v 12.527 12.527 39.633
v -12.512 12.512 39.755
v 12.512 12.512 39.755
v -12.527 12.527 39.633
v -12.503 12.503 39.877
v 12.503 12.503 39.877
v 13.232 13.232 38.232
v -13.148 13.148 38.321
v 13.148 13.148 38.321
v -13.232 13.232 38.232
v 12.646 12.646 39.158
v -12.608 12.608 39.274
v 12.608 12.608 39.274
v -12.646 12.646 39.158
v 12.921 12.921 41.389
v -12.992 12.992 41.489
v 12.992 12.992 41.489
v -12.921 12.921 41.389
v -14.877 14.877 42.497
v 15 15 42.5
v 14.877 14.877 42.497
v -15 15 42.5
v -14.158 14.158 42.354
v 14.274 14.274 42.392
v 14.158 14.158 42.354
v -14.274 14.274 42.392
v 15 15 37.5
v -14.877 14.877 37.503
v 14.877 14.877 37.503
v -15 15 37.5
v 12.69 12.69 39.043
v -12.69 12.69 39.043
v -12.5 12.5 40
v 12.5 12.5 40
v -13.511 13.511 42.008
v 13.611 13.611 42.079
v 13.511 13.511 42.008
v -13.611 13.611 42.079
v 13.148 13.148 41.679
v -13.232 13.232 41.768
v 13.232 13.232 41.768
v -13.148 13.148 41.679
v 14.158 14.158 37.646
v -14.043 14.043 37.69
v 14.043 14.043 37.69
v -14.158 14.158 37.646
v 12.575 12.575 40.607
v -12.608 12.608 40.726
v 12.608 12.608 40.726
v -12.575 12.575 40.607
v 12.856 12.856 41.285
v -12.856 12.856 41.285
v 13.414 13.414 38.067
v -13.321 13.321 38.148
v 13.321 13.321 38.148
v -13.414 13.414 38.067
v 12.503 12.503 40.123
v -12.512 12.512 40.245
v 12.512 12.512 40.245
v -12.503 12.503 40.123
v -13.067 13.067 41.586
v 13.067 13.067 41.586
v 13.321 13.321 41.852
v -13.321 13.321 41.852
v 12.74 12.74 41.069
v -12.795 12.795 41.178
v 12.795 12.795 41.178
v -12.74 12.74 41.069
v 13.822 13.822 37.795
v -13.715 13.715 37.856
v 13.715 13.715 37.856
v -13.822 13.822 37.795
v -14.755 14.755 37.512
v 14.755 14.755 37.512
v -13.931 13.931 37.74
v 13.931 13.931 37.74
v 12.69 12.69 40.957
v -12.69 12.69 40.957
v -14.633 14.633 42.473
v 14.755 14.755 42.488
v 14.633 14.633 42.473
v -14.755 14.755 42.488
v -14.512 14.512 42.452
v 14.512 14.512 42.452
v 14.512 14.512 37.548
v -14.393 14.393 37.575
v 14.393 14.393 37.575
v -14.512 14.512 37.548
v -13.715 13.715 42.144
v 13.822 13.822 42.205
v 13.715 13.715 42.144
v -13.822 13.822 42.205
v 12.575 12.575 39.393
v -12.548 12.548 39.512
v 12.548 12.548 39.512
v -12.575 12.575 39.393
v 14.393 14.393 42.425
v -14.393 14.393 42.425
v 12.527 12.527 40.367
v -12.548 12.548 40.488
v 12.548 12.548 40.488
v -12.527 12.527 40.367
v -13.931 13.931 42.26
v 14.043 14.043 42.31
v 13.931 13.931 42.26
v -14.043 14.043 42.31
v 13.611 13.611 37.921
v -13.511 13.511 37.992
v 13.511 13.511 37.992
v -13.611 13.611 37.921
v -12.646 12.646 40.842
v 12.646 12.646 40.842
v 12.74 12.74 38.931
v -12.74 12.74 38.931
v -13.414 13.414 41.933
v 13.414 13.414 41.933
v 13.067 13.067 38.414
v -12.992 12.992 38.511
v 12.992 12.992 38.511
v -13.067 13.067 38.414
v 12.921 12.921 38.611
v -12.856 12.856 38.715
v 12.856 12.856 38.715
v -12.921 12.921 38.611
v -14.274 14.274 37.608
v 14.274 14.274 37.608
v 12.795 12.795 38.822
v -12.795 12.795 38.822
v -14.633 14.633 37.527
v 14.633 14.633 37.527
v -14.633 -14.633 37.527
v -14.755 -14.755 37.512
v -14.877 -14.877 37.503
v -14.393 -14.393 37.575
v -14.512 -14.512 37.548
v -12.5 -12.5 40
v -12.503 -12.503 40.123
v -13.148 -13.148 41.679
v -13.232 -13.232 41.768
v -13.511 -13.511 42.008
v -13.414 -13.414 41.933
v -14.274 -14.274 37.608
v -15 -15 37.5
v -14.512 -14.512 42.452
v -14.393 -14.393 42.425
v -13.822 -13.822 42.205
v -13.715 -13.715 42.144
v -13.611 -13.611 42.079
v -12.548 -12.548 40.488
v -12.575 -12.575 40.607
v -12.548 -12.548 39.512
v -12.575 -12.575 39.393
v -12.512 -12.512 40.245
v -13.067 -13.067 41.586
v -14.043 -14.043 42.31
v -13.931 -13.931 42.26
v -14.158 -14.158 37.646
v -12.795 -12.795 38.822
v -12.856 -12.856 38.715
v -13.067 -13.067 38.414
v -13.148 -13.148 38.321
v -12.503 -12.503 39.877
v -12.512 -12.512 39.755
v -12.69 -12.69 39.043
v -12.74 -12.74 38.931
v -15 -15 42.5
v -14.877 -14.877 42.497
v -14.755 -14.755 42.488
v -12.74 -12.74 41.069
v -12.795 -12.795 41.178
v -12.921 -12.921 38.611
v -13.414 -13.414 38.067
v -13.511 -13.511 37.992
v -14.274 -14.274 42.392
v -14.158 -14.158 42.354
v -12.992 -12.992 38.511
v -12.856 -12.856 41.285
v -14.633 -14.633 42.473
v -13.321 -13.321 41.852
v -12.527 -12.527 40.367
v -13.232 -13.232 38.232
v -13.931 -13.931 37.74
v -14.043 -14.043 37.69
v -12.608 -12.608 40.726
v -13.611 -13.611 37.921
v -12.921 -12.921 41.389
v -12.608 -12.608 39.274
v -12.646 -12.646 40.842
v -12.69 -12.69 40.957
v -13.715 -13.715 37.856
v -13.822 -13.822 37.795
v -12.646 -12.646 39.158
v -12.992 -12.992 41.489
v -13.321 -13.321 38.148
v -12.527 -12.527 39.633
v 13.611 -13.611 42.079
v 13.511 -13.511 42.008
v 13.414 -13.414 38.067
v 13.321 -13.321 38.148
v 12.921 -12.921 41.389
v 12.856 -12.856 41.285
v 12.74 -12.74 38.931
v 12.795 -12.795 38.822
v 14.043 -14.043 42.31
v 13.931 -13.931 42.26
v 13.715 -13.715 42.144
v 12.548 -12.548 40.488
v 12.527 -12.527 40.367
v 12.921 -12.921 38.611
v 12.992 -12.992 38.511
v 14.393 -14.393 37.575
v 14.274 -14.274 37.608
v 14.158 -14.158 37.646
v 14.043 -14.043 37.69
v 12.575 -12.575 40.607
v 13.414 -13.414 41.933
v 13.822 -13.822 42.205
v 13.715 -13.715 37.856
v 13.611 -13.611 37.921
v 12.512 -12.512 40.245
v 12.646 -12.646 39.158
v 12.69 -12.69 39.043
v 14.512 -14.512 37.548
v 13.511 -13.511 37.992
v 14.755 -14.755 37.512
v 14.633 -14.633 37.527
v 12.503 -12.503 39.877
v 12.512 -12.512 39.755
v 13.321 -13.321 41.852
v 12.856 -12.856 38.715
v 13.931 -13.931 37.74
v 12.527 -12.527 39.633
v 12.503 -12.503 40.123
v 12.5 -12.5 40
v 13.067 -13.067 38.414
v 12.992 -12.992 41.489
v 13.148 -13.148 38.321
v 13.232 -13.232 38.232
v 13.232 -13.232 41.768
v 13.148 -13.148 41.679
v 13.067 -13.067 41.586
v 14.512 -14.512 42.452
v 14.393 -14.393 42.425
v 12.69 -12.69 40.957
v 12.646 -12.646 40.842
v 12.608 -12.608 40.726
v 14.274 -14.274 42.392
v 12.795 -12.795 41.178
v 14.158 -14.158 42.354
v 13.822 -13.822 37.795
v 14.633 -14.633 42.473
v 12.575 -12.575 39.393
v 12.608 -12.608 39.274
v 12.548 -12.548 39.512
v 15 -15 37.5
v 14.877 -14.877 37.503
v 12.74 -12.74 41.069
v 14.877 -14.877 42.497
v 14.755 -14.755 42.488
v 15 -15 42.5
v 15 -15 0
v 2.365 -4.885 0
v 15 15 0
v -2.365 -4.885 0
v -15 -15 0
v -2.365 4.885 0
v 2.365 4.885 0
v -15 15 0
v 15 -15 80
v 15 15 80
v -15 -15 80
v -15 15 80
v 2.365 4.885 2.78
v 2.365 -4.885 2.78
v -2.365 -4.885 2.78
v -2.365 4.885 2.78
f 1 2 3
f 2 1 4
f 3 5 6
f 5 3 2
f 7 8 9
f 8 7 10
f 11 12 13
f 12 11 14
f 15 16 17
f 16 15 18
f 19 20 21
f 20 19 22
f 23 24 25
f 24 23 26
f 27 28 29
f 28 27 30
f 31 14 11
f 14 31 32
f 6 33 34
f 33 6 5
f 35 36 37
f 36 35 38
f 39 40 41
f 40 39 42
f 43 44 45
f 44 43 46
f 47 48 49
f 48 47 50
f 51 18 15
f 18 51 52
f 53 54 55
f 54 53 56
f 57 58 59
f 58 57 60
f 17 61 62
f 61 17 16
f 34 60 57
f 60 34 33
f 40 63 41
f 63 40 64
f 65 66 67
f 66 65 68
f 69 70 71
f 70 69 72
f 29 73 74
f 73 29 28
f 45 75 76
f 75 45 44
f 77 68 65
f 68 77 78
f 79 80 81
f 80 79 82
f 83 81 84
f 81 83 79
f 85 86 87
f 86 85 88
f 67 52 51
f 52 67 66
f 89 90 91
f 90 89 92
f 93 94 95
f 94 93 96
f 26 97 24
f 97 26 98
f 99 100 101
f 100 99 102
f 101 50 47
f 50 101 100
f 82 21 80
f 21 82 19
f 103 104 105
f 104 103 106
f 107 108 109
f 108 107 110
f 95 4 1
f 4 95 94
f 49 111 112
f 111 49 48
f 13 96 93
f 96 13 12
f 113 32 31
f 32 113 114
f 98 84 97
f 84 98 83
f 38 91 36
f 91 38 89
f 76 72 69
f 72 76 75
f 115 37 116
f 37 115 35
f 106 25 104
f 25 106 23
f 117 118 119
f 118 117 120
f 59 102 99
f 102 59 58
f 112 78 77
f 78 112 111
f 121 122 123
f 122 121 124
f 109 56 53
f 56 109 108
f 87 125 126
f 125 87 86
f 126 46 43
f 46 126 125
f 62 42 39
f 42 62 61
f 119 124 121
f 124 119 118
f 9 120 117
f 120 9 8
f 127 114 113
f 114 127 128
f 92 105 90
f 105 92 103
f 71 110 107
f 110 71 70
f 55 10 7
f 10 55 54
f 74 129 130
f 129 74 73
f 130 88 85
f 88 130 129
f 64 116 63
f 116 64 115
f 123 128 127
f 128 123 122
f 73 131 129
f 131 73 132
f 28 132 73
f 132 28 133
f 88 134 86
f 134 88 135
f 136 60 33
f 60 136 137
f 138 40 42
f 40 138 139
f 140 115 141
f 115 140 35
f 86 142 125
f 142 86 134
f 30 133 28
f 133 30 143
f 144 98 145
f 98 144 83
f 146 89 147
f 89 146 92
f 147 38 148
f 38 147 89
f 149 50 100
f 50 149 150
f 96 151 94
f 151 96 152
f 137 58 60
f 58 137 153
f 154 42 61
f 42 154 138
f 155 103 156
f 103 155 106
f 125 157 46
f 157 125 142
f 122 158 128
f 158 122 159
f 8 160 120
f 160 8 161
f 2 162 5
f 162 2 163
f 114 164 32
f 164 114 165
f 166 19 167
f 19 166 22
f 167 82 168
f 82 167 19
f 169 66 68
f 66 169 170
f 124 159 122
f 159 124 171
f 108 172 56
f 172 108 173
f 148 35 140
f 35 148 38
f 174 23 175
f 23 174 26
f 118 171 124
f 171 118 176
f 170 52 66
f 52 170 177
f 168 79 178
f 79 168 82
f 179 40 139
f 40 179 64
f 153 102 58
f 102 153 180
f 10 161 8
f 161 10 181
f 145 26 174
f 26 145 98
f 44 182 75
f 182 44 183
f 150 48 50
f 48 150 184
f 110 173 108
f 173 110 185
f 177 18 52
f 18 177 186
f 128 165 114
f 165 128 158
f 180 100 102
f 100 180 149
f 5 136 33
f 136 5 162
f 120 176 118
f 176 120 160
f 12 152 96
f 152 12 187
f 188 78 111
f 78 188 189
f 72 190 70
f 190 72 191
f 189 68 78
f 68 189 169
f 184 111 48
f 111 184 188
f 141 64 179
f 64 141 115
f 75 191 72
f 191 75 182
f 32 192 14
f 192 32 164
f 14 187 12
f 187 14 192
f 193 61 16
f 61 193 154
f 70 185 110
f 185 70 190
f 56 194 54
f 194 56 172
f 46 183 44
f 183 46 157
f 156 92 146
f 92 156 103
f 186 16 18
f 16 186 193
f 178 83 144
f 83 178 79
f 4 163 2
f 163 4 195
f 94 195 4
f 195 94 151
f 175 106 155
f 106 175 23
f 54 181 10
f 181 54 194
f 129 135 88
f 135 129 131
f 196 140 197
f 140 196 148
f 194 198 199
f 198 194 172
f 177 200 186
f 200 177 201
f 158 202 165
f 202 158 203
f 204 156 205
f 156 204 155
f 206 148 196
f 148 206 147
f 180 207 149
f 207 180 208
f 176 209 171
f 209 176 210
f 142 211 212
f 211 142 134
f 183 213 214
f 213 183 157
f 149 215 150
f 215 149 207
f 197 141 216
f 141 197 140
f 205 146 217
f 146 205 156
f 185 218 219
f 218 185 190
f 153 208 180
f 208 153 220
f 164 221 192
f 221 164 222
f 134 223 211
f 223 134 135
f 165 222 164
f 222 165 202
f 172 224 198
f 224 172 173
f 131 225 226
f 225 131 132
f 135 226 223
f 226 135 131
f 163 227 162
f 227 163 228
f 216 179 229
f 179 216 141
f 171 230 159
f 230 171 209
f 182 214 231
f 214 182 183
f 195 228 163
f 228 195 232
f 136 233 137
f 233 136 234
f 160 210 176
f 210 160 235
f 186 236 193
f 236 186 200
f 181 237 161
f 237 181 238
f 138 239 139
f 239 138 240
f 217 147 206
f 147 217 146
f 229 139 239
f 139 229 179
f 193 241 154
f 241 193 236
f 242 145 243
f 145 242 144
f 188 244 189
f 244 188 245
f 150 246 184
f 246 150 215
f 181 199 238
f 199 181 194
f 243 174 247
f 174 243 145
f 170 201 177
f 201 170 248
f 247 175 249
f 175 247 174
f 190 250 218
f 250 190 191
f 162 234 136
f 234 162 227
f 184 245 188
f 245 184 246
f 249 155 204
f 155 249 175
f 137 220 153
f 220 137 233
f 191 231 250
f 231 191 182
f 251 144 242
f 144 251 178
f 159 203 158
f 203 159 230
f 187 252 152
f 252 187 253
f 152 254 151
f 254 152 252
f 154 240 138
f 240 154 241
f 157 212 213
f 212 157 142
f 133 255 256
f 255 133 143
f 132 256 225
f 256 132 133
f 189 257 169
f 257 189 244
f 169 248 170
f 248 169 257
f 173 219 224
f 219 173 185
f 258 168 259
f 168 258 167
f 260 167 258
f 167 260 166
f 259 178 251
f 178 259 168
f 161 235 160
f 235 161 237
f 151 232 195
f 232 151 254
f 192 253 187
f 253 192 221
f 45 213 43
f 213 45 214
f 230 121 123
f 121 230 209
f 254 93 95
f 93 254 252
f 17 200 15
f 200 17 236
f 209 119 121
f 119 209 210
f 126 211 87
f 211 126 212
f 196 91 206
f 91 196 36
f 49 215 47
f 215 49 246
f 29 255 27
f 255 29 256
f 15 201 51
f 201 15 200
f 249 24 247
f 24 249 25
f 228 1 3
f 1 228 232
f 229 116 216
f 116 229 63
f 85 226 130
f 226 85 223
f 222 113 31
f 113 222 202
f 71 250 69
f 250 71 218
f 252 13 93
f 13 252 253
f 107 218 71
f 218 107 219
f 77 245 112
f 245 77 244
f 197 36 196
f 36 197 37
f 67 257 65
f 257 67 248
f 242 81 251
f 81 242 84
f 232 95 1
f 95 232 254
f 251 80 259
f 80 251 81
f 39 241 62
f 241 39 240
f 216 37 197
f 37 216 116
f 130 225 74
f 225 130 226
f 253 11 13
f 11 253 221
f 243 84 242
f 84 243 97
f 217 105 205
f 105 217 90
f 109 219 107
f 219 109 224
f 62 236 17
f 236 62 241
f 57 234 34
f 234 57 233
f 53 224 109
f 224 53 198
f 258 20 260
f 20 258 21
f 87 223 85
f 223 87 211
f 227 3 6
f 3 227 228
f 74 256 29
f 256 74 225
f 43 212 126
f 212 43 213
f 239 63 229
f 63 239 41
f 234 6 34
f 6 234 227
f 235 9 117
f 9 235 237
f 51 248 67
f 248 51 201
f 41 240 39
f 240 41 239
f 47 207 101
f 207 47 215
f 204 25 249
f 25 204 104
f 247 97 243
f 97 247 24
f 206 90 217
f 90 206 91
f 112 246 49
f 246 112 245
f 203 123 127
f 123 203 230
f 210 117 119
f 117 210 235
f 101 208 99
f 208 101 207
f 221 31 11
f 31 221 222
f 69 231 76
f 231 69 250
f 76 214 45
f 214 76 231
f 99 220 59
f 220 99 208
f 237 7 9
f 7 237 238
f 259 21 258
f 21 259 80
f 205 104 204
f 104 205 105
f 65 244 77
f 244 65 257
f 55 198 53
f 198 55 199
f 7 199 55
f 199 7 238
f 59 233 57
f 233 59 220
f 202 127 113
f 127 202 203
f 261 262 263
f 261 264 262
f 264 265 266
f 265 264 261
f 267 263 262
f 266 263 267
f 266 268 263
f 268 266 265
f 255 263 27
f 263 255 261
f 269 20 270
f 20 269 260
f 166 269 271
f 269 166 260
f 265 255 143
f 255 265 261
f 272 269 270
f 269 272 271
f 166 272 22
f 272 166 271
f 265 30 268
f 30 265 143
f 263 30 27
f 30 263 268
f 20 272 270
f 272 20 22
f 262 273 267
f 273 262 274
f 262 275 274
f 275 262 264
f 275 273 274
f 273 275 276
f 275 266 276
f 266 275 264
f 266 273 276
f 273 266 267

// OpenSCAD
difference()
{
    difference()
    {
        linear_extrude(height = 80.0, twist = 0.0, scale = 1.0, slices = 1, center = false)
        {
            scale([30.0, 30.0])
            {
                M8();
            }
        }
        union()
        {
            union()
            {
                union()
                {
                    translate([-15.0, 15.0, 40.0])
                    {
                        rotate([0.0, 0.0, 0.0])
                        {
                            rotate([0.0, 90.0, 0.0])
                            {
                                rotate([0.0, 0.0, 0.0])
                                {
                                    linear_extrude(height = 31.0, twist = 0.0, scale = 1.0, slices = 1, center = false)
                                    {
                                        scale([5.0, 5.0])
                                        {
                                            M196();
                                        }
                                    }
                                }
                            }
                        }
                    }
                    translate([-15.0, 15.0, 40.0])
                    {
                        rotate([0.0, 0.0, 0.0])
                        {
                            rotate([0.0, 0.0, 0.0])
                            {
                                rotate([90.0, 0.0, 0.0])
                                {
                                    linear_extrude(height = 31.0, twist = 0.0, scale = 1.0, slices = 1, center = false)
                                    {
                                        scale([5.0, 5.0])
                                        {
                                            M196();
                                        }
                                    }
                                }
                            }
                        }
                    }
                }
                translate([-15.0, -15.0, 40.0])
                {
                    rotate([0.0, 0.0, 0.0])
                    {
                        rotate([0.0, 90.0, 0.0])
                        {
                            rotate([0.0, 0.0, 0.0])
                            {
                                linear_extrude(height = 31.0, twist = 0.0, scale = 1.0, slices = 1, center = false)
                                {
                                    scale([5.0, 5.0])
                                    {
                                        M196();
                                    }
                                }
                            }
                        }
                    }
                }
            }
            translate([15.0, 15.0, 40.0])
            {
                rotate([0.0, 0.0, 0.0])
                {
                    rotate([0.0, 0.0, 0.0])
                    {
                        rotate([90.0, 0.0, 0.0])
                        {
                            linear_extrude(height = 31.0, twist = 0.0, scale = 1.0, slices = 1, center = false)
                            {
                                scale([5.0, 5.0])
                                {
                                    M196();
                                }
                            }
                        }
                    }
                }
            }
        }
    }
    translate([0.0, 0.0, -0.1])
    {
        linear_extrude(height = 2.88, twist = 0.0, scale = 1.0, slices = 1, center = false)
        {
            scale([4.73, 9.77])
            {
                M8();
            }
        }
    }
}

module M196()
{
    polygon
    (
        points =
        [
            [0.5, 0.0], 
            [0.4993977281025862, 0.024533837163709007], 
            [0.49759236333609846, 0.0490085701647803], 
            [0.4945882549823905, 0.07336523722768087], 
            [0.4903926402016152, 0.09754516100806412], 
            [0.485015626597272, 0.12149008995163194], 
            [0.4784701678661044, 0.14514233862723117], 
            [0.4707720325915104, 0.16844492669611003], 
            [0.46193976625564337, 0.1913417161825449], 
            [0.45199464656172167, 0.21377754671514104], 
            [0.4409606321741775, 0.23569836841299882], 
            [0.42886430500013606, 0.25705137209661083], 
            [0.4157348061512726, 0.2777851165098011], 
            [0.40160376574032247, 0.2978496522462167], 
            [0.3865052266813685, 0.31719664208182274], 
            [0.37047556267747955, 0.33577947742350917], 
            [0.3535533905932738, 0.35355339059327373], 
            [0.33577947742350917, 0.37047556267747955], 
            [0.31719664208182274, 0.3865052266813685], 
            [0.29784965224621673, 0.4016037657403224], 
            [0.27778511650980114, 0.4157348061512726], 
            [0.25705137209661083, 0.42886430500013606], 
            [0.2356983684129989, 0.44096063217417747], 
            [0.2137775467151411, 0.45199464656172167], 
            [0.19134171618254492, 0.46193976625564337], 
            [0.16844492669611003, 0.4707720325915104], 
            [0.14514233862723117, 0.47847016786610447], 
            [0.12149008995163199, 0.485015626597272], 
            [0.09754516100806417, 0.4903926402016152], 
            [0.07336523722768087, 0.4945882549823905], 
            [0.049008570164780385, 0.4975923633360984], 
            [0.024533837163709063, 0.4993977281025862], 
            [3.061616997868383E-17, 0.5], 
            [-0.024533837163709004, 0.4993977281025862], 
            [-0.04900857016478032, 0.49759236333609846], 
            [-0.07336523722768082, 0.4945882549823905], 
            [-0.0975451610080641, 0.4903926402016152], 
            [-0.12149008995163194, 0.485015626597272], 
            [-0.14514233862723108, 0.47847016786610447], 
            [-0.16844492669610997, 0.4707720325915104], 
            [-0.19134171618254486, 0.46193976625564337], 
            [-0.21377754671514093, 0.4519946465617217], 
            [-0.23569836841299885, 0.4409606321741775], 
            [-0.25705137209661083, 0.42886430500013606], 
            [-0.277785116509801, 0.41573480615127273], 
            [-0.2978496522462167, 0.40160376574032247], 
            [-0.3171966420818227, 0.38650522668136855], 
            [-0.3357794774235092, 0.3704755626774795], 
            [-0.35355339059327373, 0.3535533905932738], 
            [-0.37047556267747944, 0.3357794774235093], 
            [-0.3865052266813685, 0.31719664208182274], 
            [-0.4016037657403224, 0.29784965224621673], 
            [-0.4157348061512727, 0.2777851165098011], 
            [-0.428864305000136, 0.2570513720966109], 
            [-0.44096063217417747, 0.23569836841299893], 
            [-0.45199464656172167, 0.21377754671514101], 
            [-0.46193976625564337, 0.19134171618254495], 
            [-0.47077203259151035, 0.16844492669611016], 
            [-0.4784701678661044, 0.1451423386272312], 
            [-0.485015626597272, 0.12149008995163203], 
            [-0.4903926402016152, 0.0975451610080643], 
            [-0.4945882549823905, 0.0733652372276809], 
            [-0.4975923633360984, 0.04900857016478041], 
            [-0.4993977281025862, 0.024533837163708983], 
            [-0.5, 6.123233995736766E-17], 
            [-0.4993977281025862, -0.024533837163708862], 
            [-0.49759236333609846, -0.049008570164780295], 
            [-0.4945882549823905, -0.07336523722768079], 
            [-0.4903926402016152, -0.09754516100806418], 
            [-0.485015626597272, -0.12149008995163191], 
            [-0.47847016786610447, -0.14514233862723105], 
            [-0.4707720325915104, -0.16844492669611005], 
            [-0.4619397662556434, -0.19134171618254484], 
            [-0.4519946465617217, -0.2137775467151409], 
            [-0.4409606321741775, -0.23569836841299882], 
            [-0.42886430500013606, -0.2570513720966108], 
            [-0.41573480615127273, -0.277785116509801], 
            [-0.40160376574032247, -0.2978496522462166], 
            [-0.38650522668136855, -0.31719664208182263], 
            [-0.37047556267747955, -0.3357794774235092], 
            [-0.35355339059327384, -0.35355339059327373], 
            [-0.33577947742350933, -0.37047556267747944], 
            [-0.31719664208182297, -0.38650522668136833], 
            [-0.29784965224621657, -0.4016037657403225], 
            [-0.2777851165098011, -0.4157348061512726], 
            [-0.2570513720966109, -0.428864305000136], 
            [-0.23569836841299893, -0.44096063217417747], 
            [-0.21377754671514124, -0.45199464656172156], 
            [-0.19134171618254517, -0.46193976625564326], 
            [-0.16844492669610997, -0.4707720325915104], 
            [-0.14514233862723122, -0.4784701678661044], 
            [-0.12149008995163206, -0.485015626597272], 
            [-0.09754516100806433, -0.49039264020161516], 
            [-0.07336523722768115, -0.49458825498239045], 
            [-0.049008570164780225, -0.49759236333609846], 
            [-0.024533837163709014, -0.4993977281025862], 
            [-9.184850993605148E-17, -0.5], 
            [0.02453383716370883, -0.4993977281025862], 
            [0.049008570164780045, -0.49759236333609846], 
            [0.07336523722768097, -0.49458825498239045], 
            [0.09754516100806415, -0.4903926402016152], 
            [0.12149008995163188, -0.485015626597272], 
            [0.14514233862723103, -0.47847016786610447], 
            [0.1684449266961098, -0.47077203259151046], 
            [0.191341716182545, -0.4619397662556433], 
            [0.21377754671514107, -0.45199464656172167], 
            [0.2356983684129988, -0.4409606321741775], 
            [0.2570513720966108, -0.4288643050001361], 
            [0.2777851165098009, -0.41573480615127273], 
            [0.29784965224621646, -0.40160376574032264], 
            [0.3171966420818228, -0.38650522668136844], 
            [0.33577947742350917, -0.37047556267747955], 
            [0.3535533905932737, -0.35355339059327384], 
            [0.37047556267747944, -0.33577947742350933], 
            [0.38650522668136833, -0.31719664208182297], 
            [0.4016037657403225, -0.2978496522462166], 
            [0.4157348061512726, -0.2777851165098011], 
            [0.428864305000136, -0.25705137209661094], 
            [0.4409606321741774, -0.23569836841299896], 
            [0.45199464656172156, -0.21377754671514126], 
            [0.46193976625564326, -0.1913417161825452], 
            [0.4707720325915104, -0.16844492669611], 
            [0.4784701678661044, -0.14514233862723125], 
            [0.485015626597272, -0.12149008995163209], 
            [0.49039264020161516, -0.09754516100806436], 
            [0.49458825498239045, -0.0733652372276812], 
            [0.49759236333609846, -0.04900857016478025], 
            [0.4993977281025862, -0.024533837163709046]
        ],
        paths =
        [
            [0, 1, 2, 3, 4, 5, 6, 7, 8, 9, 10, 11, 12, 13, 14, 15, 16, 17, 18, 19, 20, 21, 22, 23, 24, 25, 26, 27, 28, 29, 30, 31, 32, 33, 34, 35, 36, 37, 38, 39, 40, 41, 42, 43, 44, 45, 46, 47, 48, 49, 50, 51, 52, 53, 54, 55, 56, 57, 58, 59, 60, 61, 62, 63, 64, 65, 66, 67, 68, 69, 70, 71, 72, 73, 74, 75, 76, 77, 78, 79, 80, 81, 82, 83, 84, 85, 86, 87, 88, 89, 90, 91, 92, 93, 94, 95, 96, 97, 98, 99, 100, 101, 102, 103, 104, 105, 106, 107, 108, 109, 110, 111, 112, 113, 114, 115, 116, 117, 118, 119, 120, 121, 122, 123, 124, 125, 126, 127]
        ]
    );
}

module M8()
{
    polygon
    (
        points =
        [
            [-0.5, -0.5], 
            [0.5, -0.5], 
            [0.5, 0.5], 
            [-0.5, 0.5]
        ],
        paths =
        [
            [0, 1, 2, 3]
        ]
    );
}
